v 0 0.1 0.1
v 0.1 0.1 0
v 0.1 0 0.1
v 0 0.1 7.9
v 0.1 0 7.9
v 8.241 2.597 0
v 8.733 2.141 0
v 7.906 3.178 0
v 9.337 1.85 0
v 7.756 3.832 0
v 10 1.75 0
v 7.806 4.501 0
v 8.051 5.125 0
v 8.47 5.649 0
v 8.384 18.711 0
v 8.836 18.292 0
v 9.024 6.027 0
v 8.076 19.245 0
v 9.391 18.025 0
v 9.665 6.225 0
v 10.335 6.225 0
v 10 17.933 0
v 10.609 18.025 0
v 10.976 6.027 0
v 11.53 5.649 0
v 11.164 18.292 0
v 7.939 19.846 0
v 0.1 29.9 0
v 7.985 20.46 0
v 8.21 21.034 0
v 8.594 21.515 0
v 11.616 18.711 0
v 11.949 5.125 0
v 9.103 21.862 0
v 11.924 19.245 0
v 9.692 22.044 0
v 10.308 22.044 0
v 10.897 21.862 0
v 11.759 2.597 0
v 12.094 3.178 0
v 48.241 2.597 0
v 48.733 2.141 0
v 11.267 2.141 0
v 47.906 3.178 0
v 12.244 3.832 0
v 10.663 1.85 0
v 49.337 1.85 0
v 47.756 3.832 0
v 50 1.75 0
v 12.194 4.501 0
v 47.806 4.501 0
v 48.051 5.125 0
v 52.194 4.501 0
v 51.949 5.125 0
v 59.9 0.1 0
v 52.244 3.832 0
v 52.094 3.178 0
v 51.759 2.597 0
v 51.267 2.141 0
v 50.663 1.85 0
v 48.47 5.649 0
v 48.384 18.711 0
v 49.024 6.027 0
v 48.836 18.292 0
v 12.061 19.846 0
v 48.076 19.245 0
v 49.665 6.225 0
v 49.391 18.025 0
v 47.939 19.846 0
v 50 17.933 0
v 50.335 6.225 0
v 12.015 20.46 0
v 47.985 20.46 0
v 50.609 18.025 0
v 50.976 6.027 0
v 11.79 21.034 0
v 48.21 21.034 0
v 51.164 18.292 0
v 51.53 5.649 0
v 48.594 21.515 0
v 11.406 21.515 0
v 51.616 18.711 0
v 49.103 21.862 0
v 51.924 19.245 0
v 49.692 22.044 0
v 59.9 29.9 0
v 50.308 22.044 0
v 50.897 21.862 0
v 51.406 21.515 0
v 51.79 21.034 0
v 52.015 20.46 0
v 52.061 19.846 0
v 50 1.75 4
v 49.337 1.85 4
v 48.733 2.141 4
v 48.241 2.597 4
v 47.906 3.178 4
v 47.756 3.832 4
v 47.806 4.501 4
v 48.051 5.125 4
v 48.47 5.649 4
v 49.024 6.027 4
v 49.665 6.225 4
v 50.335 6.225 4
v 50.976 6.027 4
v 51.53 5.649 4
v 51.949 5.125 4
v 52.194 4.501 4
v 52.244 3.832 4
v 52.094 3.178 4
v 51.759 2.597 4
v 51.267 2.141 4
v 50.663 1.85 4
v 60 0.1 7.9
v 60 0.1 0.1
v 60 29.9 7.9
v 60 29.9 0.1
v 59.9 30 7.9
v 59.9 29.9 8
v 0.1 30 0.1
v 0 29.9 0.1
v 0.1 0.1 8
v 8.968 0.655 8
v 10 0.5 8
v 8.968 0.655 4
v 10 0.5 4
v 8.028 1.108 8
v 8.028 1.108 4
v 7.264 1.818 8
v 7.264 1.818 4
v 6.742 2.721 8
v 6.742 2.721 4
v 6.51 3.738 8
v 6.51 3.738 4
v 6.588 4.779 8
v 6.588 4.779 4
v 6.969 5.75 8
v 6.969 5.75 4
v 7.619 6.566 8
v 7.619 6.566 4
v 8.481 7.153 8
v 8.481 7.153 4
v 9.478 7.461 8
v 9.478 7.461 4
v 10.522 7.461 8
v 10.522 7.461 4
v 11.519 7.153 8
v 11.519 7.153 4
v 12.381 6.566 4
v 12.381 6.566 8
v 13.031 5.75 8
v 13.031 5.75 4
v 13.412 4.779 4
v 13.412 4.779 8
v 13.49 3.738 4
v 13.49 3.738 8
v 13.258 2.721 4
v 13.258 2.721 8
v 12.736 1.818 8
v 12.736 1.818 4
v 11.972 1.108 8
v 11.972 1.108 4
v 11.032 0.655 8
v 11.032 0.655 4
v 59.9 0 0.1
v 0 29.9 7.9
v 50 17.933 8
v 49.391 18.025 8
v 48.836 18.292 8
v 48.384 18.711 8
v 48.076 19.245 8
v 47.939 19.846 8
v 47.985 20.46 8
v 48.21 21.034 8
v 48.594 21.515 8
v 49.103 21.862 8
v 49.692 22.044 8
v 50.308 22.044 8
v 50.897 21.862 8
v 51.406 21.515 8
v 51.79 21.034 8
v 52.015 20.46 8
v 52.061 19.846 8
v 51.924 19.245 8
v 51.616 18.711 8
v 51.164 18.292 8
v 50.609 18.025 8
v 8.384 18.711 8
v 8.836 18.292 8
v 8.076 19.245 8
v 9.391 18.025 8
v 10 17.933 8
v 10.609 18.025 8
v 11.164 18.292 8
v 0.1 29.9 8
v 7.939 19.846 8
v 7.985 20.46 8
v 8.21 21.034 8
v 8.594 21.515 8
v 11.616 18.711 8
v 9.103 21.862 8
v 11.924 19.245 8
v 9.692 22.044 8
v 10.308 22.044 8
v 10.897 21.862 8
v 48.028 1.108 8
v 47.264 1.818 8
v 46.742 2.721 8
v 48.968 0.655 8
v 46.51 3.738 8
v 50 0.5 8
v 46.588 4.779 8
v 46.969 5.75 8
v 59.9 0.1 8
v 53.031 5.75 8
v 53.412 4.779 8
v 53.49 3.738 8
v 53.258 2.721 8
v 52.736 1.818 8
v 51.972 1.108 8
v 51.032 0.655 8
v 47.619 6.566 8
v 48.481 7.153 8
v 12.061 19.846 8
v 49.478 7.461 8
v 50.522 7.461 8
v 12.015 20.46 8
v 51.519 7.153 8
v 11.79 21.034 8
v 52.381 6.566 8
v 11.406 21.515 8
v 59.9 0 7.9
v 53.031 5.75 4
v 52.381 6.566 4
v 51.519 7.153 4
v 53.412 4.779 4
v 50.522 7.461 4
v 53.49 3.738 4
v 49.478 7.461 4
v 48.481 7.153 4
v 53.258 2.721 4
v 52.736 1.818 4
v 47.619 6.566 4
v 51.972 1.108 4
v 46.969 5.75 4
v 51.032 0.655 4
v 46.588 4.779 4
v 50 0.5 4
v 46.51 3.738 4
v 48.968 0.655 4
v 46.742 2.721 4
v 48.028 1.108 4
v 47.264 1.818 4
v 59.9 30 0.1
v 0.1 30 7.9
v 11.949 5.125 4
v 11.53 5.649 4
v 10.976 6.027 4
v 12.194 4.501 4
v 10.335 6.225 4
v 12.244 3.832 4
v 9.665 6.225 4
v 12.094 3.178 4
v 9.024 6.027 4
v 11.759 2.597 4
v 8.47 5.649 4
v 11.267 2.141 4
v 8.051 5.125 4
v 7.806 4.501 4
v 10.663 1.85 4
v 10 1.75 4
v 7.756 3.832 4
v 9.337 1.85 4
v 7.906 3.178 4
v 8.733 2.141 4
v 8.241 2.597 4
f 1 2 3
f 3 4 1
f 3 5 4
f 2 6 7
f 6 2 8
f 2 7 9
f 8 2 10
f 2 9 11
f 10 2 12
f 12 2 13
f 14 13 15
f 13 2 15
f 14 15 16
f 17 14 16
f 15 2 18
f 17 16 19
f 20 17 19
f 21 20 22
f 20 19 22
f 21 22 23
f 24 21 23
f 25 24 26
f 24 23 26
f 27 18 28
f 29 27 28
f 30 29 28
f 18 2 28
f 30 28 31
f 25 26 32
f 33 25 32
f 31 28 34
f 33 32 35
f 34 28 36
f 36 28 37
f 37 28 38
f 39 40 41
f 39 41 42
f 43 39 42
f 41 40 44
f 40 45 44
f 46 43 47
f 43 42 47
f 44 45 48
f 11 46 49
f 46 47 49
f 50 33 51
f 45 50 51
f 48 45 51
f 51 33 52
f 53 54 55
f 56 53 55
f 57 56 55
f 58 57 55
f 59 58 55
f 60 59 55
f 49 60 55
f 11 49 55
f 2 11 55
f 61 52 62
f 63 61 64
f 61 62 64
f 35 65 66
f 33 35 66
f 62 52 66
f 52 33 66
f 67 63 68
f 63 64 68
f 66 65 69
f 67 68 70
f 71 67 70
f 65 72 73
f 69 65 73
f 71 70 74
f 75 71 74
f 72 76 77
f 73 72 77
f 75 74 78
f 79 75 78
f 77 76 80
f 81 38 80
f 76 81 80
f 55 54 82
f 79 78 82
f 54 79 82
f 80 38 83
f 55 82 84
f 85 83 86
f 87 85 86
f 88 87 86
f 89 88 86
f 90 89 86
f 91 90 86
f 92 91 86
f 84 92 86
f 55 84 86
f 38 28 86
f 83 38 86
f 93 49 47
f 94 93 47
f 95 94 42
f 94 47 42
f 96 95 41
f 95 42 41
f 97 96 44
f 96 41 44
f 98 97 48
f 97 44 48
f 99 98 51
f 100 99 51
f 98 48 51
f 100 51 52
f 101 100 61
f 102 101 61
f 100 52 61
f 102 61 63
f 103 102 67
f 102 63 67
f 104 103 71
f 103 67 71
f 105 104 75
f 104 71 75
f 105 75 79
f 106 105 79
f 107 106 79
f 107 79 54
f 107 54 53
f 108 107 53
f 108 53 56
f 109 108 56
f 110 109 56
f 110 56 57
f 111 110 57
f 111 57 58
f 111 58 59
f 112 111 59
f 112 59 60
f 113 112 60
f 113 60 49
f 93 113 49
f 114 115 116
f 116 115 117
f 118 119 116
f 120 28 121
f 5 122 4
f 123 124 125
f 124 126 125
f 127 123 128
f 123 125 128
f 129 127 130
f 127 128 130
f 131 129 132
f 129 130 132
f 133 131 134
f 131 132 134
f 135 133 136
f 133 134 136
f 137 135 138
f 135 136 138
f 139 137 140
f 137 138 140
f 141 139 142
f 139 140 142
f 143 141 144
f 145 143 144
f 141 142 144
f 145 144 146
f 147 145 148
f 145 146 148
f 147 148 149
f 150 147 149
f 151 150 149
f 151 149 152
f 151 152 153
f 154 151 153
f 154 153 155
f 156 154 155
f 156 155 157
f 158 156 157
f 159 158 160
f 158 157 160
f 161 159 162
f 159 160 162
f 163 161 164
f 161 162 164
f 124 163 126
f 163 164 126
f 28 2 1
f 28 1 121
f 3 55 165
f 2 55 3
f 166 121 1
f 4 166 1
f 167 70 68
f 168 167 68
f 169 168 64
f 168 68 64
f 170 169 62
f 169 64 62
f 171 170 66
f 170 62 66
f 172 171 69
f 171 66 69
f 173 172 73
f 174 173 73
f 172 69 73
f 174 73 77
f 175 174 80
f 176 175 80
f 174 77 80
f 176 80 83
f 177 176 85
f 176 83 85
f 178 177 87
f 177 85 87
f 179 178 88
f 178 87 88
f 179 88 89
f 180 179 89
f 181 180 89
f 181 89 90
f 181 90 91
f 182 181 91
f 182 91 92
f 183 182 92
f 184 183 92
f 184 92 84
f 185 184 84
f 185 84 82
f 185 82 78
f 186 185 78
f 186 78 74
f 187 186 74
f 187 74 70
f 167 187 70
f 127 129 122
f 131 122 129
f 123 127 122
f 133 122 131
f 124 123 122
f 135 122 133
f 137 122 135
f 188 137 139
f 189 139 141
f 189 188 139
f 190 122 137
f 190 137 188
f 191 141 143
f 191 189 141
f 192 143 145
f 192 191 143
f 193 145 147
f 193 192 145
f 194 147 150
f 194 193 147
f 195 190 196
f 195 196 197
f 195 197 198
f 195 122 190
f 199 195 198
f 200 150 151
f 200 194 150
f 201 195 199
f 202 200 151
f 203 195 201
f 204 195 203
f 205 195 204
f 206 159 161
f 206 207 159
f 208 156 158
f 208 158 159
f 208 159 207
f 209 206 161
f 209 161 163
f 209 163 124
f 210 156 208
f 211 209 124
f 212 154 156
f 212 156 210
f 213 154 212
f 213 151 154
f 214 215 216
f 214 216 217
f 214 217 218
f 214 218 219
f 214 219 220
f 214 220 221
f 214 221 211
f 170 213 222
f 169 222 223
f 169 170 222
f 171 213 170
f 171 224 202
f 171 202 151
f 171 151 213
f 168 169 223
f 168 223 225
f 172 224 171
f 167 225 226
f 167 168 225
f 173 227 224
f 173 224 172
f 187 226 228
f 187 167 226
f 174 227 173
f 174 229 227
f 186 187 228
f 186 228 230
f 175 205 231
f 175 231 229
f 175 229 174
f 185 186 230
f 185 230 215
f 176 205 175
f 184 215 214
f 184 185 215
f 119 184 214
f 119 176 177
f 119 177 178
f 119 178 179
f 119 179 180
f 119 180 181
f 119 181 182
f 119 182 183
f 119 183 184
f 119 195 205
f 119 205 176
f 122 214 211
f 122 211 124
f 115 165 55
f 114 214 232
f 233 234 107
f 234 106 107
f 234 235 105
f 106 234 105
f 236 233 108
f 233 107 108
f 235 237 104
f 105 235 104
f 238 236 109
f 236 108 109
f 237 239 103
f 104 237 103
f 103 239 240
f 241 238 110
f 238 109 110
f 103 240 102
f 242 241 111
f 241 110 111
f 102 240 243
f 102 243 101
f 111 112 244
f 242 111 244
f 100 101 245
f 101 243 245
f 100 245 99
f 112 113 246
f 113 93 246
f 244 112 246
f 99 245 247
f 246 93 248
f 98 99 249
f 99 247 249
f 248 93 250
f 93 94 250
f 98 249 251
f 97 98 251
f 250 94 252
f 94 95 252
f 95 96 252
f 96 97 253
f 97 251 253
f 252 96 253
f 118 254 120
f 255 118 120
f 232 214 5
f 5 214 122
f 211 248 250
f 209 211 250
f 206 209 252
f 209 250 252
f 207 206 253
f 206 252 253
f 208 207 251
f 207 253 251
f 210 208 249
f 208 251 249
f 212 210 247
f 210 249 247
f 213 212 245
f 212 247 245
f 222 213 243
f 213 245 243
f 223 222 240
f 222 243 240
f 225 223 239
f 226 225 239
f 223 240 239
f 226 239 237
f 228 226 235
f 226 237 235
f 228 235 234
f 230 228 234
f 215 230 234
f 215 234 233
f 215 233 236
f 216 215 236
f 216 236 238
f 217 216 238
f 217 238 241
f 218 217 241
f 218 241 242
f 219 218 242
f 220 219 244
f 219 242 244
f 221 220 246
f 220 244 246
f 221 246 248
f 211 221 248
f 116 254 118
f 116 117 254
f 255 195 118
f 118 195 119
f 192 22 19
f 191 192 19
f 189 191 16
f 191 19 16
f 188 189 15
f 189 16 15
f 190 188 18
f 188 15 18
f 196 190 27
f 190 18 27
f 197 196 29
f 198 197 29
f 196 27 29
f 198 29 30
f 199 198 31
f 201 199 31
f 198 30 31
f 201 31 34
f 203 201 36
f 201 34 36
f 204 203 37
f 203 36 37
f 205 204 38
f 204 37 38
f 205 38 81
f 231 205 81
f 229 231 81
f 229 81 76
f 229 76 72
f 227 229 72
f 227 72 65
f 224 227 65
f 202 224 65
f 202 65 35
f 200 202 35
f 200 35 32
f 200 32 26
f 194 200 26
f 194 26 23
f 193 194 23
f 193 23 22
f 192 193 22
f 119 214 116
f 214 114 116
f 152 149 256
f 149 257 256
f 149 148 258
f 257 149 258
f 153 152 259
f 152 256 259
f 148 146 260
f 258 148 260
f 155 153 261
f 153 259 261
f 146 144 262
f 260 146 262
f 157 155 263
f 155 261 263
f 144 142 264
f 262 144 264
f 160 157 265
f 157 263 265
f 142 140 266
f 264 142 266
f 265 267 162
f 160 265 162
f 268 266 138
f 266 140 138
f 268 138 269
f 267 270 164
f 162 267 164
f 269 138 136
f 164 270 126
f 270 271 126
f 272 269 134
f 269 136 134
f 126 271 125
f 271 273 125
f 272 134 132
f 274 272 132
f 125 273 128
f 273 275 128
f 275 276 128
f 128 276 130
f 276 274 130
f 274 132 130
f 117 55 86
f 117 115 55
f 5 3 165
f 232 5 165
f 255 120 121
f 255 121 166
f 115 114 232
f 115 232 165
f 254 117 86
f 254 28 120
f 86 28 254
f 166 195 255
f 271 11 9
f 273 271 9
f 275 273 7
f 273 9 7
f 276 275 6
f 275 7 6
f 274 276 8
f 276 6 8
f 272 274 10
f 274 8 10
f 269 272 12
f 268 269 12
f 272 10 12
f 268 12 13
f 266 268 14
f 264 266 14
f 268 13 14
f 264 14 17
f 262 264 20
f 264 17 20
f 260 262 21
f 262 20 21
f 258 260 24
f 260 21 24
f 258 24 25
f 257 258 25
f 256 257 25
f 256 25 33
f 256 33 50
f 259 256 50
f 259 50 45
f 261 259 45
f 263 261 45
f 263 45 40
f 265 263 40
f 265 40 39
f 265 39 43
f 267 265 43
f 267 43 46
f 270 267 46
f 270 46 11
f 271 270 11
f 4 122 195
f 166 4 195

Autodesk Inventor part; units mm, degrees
ref_plane "YZ Plane" through (0, 0, 0) normal (1, 0, 0) x (0, 1, 0)
ref_plane "XZ Plane" through (0, 0, 0) normal (0, 1, 0) x (-1, 0, 0)
ref_plane "XY Plane" through (0, 0, 0) normal (0, 0, 1) x (1, 0, 0)
sketch "Sketch1" plane through (0, 0, 0) normal (0, 0, 1) x (1, 0, 0)
  line L0 (0, 0) -> (60, 0)
  line L1 (60, 0) -> (60, 30)
  line L2 (60, 30) -> (0, 30)
  line L3 (0, 30) -> (0, 0)
  dimension "d0" = 60
  dimension "d1" = 30
extrude "Extrusion1" add sketch "Sketch1" along normal blind 8
sketch "Sketch2" plane through (0, 0, 8) normal (0, 0, 1) x (1, 0, 0)
  circle A0 centre (10, 4) radius 2 projected
  circle A1 centre (50, 4) radius 2 projected
  point P0 (0, 0)
hole "Hole1" at (10, 4, 8) at (50, 4, 8) direction (0, 0, -1) diameter 4.5 end through all counterbore diameter 7 counterbore depth 4
sketch "Sketch3" plane through (0, 0, 8) normal (0, 0, 1) x (1, 0, 0)
  line L0 (0, 0) -> (60, 0) construction
  line L1 (30, 0) -> (30, 50) construction
  line L2 (30, 0) -> (80, 0) construction
  line L3 (-6.3387, 20) -> (66.0929, 20) construction
  line L4 (0, 30) -> (0, 0) projected
  line L5 (60, 0) -> (60, 30) projected
  point P0 (50, 20)
  point P1 (10, 20)
  dimension "d11" = 50
  dimension "d12" = 90
  dimension "d13" = 20
  dimension "d14" = 10
  dimension "d15" = 10
hole "Hole2" at (50, 20, 8) at (10, 20, 8) direction (0, 0, -1) diameter 4.134 end through all thread size "M5x0.8" class "6H" standard "ISO Metric profile"
chamfer "Chamfer1" distance 0.1 angle 45 12 edges at (60, 15, 8) (30, 30, 8) (30, 0, 8) (0, 15, 8) (0, 15, 0) (30, 0, 0) (0, 0, 4) (60, 0, 4) (60, 15, 0) (60, 30, 4) (30, 30, 0) (0, 30, 4)
equation "\"d15\" = d14"
properties part number "Portal-Column-v2-Top" material "Aluminum 6061"
